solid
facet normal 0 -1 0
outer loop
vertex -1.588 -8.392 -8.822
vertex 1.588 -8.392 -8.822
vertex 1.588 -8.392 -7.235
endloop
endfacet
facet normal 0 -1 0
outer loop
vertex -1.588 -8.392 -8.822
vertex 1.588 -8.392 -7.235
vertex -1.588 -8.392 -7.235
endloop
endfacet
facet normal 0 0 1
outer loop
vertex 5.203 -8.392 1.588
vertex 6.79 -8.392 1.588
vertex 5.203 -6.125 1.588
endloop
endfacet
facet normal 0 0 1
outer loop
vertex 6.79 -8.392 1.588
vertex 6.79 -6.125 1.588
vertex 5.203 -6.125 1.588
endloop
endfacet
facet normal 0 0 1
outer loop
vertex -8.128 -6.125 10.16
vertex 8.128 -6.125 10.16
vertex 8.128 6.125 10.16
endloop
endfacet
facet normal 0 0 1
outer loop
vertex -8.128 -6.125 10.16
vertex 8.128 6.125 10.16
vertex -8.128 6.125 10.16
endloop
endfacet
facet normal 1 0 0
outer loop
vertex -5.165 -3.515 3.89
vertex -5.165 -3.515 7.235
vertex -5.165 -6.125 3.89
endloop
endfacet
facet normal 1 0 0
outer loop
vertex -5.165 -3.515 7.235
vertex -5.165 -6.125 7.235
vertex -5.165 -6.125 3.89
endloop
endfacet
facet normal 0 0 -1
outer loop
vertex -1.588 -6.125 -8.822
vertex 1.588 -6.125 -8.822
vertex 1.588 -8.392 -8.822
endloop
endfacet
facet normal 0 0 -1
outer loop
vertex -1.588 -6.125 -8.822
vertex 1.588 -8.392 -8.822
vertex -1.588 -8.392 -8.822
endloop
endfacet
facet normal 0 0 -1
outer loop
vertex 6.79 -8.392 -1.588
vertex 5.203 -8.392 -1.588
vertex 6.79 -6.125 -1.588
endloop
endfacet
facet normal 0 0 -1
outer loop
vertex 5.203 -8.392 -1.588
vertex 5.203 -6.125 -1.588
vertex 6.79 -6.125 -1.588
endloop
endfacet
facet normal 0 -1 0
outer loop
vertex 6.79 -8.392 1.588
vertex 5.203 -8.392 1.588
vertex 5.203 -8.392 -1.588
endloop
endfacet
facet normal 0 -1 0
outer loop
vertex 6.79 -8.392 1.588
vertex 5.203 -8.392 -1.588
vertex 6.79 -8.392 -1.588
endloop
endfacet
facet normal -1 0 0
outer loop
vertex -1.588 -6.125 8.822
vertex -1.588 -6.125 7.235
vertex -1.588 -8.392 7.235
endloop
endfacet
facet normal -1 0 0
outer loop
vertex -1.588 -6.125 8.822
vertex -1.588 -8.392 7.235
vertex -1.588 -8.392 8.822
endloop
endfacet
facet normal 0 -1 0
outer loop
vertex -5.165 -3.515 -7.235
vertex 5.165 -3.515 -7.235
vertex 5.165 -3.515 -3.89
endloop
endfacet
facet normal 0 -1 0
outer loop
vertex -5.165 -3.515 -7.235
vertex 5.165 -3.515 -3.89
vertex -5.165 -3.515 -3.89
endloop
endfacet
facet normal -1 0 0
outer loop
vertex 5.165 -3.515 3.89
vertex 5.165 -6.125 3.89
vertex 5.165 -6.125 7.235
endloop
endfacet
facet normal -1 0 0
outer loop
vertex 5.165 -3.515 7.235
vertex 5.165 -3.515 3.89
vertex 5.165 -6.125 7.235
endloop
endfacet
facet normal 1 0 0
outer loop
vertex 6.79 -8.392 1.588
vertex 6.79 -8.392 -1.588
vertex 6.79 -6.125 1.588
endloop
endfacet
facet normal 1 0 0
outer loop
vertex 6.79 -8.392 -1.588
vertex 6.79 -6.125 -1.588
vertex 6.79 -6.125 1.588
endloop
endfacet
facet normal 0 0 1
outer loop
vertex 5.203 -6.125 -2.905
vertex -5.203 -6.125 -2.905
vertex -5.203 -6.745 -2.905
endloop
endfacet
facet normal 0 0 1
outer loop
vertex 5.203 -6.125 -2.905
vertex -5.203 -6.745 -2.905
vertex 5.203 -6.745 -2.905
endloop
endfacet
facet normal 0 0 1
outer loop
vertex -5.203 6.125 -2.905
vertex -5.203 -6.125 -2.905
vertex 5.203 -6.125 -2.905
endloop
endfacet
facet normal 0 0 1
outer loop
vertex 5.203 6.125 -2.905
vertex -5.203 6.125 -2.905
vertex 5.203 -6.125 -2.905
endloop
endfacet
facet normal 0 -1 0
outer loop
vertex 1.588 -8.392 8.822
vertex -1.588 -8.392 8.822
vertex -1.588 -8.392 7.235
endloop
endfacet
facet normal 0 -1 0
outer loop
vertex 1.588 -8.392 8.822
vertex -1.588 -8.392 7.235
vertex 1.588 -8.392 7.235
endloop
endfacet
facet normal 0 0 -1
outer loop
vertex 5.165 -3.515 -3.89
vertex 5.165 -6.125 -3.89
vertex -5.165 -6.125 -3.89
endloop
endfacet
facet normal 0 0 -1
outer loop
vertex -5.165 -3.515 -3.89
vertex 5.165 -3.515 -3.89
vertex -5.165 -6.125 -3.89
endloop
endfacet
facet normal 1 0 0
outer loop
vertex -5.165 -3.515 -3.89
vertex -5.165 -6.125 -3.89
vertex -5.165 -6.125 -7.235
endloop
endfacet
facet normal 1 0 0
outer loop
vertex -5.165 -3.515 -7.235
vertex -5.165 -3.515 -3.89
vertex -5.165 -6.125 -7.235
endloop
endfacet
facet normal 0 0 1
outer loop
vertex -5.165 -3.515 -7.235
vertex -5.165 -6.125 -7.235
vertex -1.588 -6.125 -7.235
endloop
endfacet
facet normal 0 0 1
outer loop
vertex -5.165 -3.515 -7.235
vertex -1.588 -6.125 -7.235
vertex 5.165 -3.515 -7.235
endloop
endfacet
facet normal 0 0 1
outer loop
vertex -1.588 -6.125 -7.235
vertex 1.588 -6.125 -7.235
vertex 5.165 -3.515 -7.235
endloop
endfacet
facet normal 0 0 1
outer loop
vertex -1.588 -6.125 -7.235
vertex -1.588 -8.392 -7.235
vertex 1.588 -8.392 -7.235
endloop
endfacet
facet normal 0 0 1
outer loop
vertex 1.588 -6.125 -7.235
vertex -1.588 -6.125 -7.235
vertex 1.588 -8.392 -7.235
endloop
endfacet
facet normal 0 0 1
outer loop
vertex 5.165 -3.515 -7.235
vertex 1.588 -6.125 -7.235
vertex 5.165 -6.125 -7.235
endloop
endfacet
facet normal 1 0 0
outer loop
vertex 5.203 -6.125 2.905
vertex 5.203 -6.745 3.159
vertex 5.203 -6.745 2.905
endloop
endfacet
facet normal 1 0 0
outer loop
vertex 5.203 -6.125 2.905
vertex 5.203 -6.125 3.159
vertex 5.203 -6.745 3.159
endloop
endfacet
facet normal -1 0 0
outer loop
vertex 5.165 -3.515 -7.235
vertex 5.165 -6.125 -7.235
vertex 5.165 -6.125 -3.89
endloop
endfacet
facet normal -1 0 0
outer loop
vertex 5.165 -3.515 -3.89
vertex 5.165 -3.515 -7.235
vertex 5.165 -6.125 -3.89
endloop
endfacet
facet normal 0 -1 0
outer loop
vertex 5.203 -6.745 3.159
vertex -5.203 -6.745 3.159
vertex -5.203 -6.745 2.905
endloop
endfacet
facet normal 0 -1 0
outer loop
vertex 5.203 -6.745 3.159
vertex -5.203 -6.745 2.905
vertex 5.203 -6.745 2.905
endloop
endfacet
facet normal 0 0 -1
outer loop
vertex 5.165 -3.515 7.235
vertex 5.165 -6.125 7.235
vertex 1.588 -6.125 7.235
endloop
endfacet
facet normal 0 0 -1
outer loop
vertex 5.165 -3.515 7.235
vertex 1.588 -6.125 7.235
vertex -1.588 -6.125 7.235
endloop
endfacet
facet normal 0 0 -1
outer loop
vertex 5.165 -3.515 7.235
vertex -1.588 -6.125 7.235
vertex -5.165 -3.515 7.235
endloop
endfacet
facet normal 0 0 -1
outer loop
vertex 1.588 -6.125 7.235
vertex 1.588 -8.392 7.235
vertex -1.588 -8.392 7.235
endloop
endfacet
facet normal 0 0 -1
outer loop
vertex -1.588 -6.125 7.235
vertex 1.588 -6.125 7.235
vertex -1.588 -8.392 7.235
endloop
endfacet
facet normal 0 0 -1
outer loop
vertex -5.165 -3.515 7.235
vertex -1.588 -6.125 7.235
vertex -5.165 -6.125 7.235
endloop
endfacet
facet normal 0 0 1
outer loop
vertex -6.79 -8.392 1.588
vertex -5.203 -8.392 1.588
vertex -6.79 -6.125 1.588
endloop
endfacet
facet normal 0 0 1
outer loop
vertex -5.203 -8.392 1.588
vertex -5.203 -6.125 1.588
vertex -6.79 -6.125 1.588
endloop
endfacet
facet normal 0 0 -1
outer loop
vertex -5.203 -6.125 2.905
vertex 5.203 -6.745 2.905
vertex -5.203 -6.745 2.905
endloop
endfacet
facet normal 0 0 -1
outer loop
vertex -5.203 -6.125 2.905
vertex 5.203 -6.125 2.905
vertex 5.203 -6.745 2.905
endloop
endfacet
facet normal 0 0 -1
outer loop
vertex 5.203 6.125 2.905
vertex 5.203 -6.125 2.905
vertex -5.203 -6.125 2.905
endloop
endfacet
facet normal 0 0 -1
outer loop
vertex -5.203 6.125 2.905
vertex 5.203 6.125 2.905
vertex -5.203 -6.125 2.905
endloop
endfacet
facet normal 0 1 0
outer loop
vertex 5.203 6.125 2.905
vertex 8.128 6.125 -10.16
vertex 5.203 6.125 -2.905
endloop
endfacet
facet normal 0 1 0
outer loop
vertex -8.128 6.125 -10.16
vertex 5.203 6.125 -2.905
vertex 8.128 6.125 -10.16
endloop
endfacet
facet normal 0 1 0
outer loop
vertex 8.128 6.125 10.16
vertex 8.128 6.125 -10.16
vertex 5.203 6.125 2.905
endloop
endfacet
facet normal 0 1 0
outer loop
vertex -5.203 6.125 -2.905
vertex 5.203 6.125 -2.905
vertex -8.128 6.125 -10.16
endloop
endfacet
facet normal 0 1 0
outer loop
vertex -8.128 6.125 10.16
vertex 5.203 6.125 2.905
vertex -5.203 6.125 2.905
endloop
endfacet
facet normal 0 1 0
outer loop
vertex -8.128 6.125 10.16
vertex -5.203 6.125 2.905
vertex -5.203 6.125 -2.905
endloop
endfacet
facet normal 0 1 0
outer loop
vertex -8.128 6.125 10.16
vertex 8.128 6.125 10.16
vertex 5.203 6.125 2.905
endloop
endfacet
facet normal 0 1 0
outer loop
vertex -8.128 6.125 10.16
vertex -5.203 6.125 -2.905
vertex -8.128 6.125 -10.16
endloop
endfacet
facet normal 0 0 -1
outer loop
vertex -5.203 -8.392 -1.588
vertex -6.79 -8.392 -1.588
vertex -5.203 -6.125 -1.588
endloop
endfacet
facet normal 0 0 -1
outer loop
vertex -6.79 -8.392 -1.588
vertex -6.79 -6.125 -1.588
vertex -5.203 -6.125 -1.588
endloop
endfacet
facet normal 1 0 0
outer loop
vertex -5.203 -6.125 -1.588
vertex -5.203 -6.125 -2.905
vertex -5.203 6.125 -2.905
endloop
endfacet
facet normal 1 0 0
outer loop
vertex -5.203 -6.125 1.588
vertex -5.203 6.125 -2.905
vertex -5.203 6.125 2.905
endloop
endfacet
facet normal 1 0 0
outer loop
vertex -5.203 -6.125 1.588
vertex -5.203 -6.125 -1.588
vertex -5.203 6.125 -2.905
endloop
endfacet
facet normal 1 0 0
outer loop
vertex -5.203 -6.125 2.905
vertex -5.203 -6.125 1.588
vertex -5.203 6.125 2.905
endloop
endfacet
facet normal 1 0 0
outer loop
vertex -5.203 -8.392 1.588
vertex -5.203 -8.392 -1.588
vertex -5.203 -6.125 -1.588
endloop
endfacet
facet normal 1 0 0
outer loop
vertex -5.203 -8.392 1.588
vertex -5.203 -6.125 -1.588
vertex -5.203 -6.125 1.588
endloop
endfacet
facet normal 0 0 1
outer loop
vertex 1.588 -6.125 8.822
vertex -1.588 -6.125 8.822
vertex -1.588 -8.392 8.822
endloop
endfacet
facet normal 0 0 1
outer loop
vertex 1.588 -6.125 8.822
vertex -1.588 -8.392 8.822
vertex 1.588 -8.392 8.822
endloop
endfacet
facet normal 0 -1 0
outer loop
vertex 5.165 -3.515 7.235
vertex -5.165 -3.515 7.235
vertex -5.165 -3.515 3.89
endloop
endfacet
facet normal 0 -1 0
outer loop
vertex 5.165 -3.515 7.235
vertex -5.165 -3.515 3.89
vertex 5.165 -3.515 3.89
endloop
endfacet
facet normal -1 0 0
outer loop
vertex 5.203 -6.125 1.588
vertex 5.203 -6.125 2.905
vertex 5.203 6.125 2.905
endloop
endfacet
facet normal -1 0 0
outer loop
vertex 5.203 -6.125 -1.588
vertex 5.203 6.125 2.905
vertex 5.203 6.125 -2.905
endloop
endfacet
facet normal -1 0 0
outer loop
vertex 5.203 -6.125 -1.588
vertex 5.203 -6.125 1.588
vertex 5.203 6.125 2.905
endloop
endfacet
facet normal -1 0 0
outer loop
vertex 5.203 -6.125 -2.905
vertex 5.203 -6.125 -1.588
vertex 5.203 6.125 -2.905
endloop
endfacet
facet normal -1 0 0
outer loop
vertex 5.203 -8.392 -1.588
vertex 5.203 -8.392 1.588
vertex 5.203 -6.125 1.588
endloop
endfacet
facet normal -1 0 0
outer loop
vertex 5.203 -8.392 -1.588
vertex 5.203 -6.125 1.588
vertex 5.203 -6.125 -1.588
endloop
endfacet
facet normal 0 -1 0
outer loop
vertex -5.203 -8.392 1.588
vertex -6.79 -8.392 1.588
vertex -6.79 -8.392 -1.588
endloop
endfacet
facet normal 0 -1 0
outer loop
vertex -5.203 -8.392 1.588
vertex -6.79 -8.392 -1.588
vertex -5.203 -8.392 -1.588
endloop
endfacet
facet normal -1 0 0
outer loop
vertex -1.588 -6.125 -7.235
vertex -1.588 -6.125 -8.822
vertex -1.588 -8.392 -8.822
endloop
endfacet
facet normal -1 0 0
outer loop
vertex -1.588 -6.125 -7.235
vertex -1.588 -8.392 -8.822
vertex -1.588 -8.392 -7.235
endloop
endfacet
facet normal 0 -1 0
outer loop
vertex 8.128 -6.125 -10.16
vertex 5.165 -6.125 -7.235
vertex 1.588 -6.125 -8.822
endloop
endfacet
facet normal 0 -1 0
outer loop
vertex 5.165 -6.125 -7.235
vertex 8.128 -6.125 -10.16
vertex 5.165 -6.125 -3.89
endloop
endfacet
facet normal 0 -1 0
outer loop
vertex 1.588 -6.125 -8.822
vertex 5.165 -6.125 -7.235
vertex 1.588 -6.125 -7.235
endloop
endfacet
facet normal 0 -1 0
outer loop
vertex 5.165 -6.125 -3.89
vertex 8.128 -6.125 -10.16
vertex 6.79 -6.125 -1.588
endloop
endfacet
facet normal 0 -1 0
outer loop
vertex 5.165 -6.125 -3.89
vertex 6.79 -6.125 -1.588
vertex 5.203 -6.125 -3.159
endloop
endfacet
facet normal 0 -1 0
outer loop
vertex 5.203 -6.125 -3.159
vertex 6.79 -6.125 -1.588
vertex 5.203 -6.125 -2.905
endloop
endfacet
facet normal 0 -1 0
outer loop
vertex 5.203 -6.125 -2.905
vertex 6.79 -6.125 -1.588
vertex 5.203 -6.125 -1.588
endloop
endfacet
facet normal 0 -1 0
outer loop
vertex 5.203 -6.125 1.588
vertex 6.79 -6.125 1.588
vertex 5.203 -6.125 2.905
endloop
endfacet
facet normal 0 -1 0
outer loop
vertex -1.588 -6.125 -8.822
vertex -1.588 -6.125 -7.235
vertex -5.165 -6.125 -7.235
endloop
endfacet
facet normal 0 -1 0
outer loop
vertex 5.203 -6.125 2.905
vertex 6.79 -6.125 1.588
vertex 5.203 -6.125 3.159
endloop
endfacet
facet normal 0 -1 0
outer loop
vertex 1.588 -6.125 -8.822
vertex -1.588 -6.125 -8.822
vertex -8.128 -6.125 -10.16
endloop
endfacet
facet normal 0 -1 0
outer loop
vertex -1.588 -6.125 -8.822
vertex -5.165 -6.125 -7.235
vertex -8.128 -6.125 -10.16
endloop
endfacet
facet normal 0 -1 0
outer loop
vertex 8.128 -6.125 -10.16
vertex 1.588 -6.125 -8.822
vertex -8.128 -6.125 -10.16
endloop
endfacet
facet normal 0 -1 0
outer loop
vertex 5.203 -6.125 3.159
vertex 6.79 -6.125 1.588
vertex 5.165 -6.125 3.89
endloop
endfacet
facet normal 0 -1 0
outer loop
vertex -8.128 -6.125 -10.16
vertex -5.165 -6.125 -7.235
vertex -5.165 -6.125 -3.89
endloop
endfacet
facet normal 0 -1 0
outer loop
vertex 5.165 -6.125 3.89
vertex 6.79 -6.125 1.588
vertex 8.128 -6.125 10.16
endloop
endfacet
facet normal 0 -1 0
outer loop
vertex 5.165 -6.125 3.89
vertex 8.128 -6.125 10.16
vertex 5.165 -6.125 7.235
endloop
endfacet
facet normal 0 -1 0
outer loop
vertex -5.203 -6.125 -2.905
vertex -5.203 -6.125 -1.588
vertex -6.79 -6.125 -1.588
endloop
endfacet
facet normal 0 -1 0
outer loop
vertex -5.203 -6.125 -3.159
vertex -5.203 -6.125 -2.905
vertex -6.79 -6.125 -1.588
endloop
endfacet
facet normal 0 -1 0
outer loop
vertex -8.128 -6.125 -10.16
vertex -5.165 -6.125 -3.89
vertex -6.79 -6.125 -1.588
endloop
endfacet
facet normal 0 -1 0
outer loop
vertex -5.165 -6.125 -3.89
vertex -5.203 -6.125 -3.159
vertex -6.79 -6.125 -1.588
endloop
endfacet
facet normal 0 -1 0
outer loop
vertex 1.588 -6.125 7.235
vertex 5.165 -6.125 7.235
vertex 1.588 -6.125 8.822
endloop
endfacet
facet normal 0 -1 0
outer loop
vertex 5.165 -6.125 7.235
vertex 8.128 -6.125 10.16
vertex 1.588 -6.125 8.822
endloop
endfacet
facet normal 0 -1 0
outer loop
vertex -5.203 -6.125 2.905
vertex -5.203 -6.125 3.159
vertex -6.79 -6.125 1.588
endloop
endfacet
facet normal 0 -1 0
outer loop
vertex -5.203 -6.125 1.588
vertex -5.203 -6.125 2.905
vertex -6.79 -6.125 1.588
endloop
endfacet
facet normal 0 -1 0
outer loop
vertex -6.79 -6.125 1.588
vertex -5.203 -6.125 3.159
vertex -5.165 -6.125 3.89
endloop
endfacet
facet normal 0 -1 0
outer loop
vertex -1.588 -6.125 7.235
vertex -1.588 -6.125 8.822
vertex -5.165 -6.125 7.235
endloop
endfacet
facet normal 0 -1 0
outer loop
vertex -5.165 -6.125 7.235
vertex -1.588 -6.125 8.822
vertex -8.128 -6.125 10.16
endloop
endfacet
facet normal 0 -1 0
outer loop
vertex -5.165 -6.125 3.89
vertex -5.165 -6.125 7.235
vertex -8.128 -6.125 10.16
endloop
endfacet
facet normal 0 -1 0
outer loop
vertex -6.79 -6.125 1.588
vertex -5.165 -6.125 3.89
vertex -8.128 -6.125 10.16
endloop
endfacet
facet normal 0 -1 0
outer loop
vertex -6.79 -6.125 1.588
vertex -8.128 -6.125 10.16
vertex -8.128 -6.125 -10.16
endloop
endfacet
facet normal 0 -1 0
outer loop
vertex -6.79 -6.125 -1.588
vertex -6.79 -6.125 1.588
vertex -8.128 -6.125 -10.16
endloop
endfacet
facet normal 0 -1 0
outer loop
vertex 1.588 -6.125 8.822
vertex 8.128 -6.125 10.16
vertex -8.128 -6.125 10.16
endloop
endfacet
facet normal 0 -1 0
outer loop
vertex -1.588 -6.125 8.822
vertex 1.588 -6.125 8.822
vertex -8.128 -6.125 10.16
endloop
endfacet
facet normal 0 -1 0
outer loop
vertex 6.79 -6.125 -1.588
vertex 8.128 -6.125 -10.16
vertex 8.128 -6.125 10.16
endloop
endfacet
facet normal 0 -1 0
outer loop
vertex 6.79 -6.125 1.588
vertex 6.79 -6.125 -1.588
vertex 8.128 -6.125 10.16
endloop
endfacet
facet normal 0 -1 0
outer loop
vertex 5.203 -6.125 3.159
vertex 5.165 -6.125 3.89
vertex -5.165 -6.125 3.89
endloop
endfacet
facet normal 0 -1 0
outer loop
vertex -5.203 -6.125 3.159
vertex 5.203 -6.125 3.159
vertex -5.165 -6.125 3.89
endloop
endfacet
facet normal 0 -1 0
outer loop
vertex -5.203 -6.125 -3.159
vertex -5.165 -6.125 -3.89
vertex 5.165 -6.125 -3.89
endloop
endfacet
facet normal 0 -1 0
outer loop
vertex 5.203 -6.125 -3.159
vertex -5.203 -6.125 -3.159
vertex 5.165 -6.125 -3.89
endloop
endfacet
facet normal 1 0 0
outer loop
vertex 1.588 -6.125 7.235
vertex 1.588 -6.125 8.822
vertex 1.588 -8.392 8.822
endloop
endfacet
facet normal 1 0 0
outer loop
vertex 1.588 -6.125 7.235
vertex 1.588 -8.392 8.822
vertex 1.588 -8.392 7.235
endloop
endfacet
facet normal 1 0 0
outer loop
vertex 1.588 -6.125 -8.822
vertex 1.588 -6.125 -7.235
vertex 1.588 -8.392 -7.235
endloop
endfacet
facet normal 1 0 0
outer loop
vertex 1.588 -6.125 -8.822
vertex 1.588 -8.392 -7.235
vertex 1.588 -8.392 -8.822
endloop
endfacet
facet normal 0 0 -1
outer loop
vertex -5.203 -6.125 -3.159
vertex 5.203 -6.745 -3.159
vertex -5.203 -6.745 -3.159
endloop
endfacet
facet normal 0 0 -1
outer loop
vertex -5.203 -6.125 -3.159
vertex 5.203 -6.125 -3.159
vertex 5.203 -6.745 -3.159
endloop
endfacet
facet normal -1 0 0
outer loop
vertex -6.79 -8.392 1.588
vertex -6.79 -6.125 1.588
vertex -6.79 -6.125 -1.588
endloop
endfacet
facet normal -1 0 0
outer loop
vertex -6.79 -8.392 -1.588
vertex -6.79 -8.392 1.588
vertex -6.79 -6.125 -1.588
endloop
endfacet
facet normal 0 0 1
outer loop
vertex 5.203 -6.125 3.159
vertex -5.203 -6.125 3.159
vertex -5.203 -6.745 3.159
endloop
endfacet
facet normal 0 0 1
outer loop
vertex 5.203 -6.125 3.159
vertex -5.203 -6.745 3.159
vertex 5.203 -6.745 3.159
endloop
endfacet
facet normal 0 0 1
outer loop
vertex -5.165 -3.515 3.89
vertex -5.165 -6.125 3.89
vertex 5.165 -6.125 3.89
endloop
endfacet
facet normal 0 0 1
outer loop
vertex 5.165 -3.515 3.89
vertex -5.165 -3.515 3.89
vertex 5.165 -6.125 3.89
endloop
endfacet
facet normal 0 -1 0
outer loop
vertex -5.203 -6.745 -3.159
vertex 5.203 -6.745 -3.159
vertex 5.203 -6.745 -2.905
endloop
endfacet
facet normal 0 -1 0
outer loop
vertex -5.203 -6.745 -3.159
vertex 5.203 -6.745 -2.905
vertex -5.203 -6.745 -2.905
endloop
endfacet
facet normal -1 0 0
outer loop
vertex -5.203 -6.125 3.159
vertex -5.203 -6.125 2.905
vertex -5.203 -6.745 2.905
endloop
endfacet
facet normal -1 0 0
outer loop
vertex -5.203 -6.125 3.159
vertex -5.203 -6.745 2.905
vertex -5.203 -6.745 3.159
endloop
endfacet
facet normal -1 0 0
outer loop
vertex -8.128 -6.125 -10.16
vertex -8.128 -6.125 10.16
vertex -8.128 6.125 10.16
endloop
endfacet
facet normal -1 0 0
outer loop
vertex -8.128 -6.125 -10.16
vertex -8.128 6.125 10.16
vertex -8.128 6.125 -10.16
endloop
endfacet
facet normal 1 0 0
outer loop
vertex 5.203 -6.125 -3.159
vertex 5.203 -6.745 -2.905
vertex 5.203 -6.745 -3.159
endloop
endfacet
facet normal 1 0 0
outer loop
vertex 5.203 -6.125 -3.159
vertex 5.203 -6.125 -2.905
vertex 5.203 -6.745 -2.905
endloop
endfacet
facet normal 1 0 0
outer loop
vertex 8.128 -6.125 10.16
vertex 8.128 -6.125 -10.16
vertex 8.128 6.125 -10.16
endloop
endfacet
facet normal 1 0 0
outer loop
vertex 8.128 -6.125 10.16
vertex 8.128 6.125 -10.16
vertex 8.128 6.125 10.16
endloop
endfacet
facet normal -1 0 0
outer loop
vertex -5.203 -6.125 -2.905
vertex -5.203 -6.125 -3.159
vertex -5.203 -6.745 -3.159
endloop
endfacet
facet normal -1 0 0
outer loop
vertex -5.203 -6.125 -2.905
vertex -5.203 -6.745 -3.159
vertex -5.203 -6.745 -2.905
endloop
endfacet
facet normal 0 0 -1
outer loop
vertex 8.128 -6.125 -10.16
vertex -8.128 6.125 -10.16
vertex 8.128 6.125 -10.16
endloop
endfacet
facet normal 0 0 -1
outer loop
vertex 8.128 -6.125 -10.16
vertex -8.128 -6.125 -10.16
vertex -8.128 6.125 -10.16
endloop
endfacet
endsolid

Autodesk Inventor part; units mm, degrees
ref_plane "YZ Plane" through (0, 0, 0) normal (1, 0, 0) x (0, 1, 0)
ref_plane "XZ Plane" through (0, 0, 0) normal (0, 1, 0) x (-1, 0, 0)
ref_plane "XY Plane" through (0, 0, 0) normal (0, 0, 1) x (1, 0, 0)
sketch "Sketch1" plane through (0, 0, 0) normal (0, 1, 0) x (-1, 0, 0)
  line L0 (-8.128, 10.16) -> (8.128, 10.16)
  line L1 (8.128, 10.16) -> (8.128, -10.16)
  line L2 (8.128, -10.16) -> (-8.128, -10.16)
  line L3 (-8.128, -10.16) -> (-8.128, 10.16)
  line L4 (-8.128, 10.16) -> (8.128, -10.16) construction
  line L5 (8.128, 10.16) -> (-8.128, -10.16) construction
  point P0 (0, 0)
  dimension "d0" = 20.32
  dimension "d1" = 16.256
extrude "Extrusion1" add sketch "Sketch1" along normal mid plane 12.2492
sketch "Sketch3" plane through (0, -6.1246, 0) normal (0, -1, 0) x (1, 0, 0)
  line L0 (-5.203, 2.905) -> (5.203, 2.905)
  line L1 (5.203, 2.905) -> (5.203, -2.905)
  line L2 (5.203, -2.905) -> (-5.203, -2.905)
  line L3 (-5.203, -2.905) -> (-5.203, 2.905)
  line L4 (-5.203, 2.905) -> (5.203, -2.905) construction
  line L5 (5.203, 2.905) -> (-5.203, -2.905) construction
  point P0 (0, 0)
  dimension "d4" = 5.81
  dimension "d5" = 10.406
extrude "Extrusion2" cut sketch "Sketch3" against normal through all
sketch "Sketch4" plane through (0, -6.1246, 0) normal (0, -1, 0) x (1, 0, 0)
  line L0 (-4.9149, 6.985) -> (4.9149, 6.985) construction
  line L1 (4.9149, 6.985) -> (4.9149, 4.1402) construction
  line L2 (4.9149, 4.1402) -> (-4.9149, 4.1402) construction
  line L3 (-4.9149, 4.1402) -> (-4.9149, 6.985) construction
  line L4 (-4.9149, 6.985) -> (4.9149, 4.1402) construction
  line L5 (4.9149, 6.985) -> (-4.9149, 4.1402) construction
  line L6 (5.1649, 7.235) -> (-5.1649, 7.235)
  line L7 (-5.1649, 7.235) -> (-5.1649, 3.8902)
  line L8 (-5.1649, 3.8902) -> (5.1649, 3.8902)
  line L9 (5.1649, 3.8902) -> (5.1649, 7.235)
  point P0 (0, 0)
  point P1 (0, 5.5626)
  dimension "d8" = 2.8448
  dimension "d9" = 9.8298
  dimension "d10" = 6.985
  dimension "d13" = 0.25
extrude "Extrusion3" cut sketch "Sketch4" against normal blind 2.6099
mirror "Mirror1" about plane through (0, 0, 0) normal (0, 0, 1) of "Extrusion3"
sketch "Sketch5" plane through (0, -6.1246, 0) normal (0, -1, 0) x (1, 0, 0)
  line L0 (-5.203, -2.905) -> (-5.203, 2.905) projected
  line L1 (-5.203, 1.5875) -> (-6.7905, 1.5875)
  line L2 (-6.7905, 1.5875) -> (-6.7905, -1.5875)
  line L3 (-6.7905, -1.5875) -> (-5.203, -1.5875)
  line L4 (-5.203, -1.5875) -> (-5.203, 1.5875)
  point P0 (0, 0)
  point P1 (-6.7905, 0)
  dimension "d14" = 1.5875
  dimension "d15" = 3.175
extrude "Extrusion4" add sketch "Sketch5" along normal blind 2.2669
mirror "Mirror2" about plane through (0, 0, 0) normal (1, 0, 0) of "Extrusion4"
sketch "Sketch6" plane through (0, -6.1246, 0) normal (0, -1, 0) x (1, 0, 0)
  line L0 (-5.1649, 7.235) -> (5.1649, 7.235) projected
  line L1 (1.5875, 7.235) -> (-1.5875, 7.235)
  line L2 (-1.5875, 7.235) -> (-1.5875, 8.8225)
  line L3 (-1.5875, 8.8225) -> (1.5875, 8.8225)
  line L4 (1.5875, 8.8225) -> (1.5875, 7.235)
  point P0 (0, 0)
  point P1 (0, 7.235)
  dimension "d18" = 1.5875
  dimension "d19" = 3.175
extrude "Extrusion5" add sketch "Sketch6" along normal up to surface (2.2669 mm away)
mirror "Mirror3" about plane through (0, 0, 0) normal (0, 0, 1) of "Extrusion5"
sketch "Sketch7" plane through (0, -6.1246, 0) normal (0, -1, 0) x (1, 0, 0)
  line L0 (5.203, -2.905) -> (5.203, 2.905) projected
  line L1 (5.203, 2.905) -> (-5.203, 2.905)
  line L2 (-5.203, 2.905) -> (-5.203, 3.159)
  line L3 (-5.203, 3.159) -> (5.203, 3.159)
  line L4 (5.203, 3.159) -> (5.203, 2.905)
  point P0 (0, 0)
  point P1 (-5.203, 3.032)
  dimension "d22" = 0.254
extrude "Extrusion6" add sketch "Sketch7" along normal blind 0.62
mirror "Mirror4" about plane through (0, 0, 0) normal (0, 0, 1) of "Extrusion6"
properties part number "magnet_jig"
